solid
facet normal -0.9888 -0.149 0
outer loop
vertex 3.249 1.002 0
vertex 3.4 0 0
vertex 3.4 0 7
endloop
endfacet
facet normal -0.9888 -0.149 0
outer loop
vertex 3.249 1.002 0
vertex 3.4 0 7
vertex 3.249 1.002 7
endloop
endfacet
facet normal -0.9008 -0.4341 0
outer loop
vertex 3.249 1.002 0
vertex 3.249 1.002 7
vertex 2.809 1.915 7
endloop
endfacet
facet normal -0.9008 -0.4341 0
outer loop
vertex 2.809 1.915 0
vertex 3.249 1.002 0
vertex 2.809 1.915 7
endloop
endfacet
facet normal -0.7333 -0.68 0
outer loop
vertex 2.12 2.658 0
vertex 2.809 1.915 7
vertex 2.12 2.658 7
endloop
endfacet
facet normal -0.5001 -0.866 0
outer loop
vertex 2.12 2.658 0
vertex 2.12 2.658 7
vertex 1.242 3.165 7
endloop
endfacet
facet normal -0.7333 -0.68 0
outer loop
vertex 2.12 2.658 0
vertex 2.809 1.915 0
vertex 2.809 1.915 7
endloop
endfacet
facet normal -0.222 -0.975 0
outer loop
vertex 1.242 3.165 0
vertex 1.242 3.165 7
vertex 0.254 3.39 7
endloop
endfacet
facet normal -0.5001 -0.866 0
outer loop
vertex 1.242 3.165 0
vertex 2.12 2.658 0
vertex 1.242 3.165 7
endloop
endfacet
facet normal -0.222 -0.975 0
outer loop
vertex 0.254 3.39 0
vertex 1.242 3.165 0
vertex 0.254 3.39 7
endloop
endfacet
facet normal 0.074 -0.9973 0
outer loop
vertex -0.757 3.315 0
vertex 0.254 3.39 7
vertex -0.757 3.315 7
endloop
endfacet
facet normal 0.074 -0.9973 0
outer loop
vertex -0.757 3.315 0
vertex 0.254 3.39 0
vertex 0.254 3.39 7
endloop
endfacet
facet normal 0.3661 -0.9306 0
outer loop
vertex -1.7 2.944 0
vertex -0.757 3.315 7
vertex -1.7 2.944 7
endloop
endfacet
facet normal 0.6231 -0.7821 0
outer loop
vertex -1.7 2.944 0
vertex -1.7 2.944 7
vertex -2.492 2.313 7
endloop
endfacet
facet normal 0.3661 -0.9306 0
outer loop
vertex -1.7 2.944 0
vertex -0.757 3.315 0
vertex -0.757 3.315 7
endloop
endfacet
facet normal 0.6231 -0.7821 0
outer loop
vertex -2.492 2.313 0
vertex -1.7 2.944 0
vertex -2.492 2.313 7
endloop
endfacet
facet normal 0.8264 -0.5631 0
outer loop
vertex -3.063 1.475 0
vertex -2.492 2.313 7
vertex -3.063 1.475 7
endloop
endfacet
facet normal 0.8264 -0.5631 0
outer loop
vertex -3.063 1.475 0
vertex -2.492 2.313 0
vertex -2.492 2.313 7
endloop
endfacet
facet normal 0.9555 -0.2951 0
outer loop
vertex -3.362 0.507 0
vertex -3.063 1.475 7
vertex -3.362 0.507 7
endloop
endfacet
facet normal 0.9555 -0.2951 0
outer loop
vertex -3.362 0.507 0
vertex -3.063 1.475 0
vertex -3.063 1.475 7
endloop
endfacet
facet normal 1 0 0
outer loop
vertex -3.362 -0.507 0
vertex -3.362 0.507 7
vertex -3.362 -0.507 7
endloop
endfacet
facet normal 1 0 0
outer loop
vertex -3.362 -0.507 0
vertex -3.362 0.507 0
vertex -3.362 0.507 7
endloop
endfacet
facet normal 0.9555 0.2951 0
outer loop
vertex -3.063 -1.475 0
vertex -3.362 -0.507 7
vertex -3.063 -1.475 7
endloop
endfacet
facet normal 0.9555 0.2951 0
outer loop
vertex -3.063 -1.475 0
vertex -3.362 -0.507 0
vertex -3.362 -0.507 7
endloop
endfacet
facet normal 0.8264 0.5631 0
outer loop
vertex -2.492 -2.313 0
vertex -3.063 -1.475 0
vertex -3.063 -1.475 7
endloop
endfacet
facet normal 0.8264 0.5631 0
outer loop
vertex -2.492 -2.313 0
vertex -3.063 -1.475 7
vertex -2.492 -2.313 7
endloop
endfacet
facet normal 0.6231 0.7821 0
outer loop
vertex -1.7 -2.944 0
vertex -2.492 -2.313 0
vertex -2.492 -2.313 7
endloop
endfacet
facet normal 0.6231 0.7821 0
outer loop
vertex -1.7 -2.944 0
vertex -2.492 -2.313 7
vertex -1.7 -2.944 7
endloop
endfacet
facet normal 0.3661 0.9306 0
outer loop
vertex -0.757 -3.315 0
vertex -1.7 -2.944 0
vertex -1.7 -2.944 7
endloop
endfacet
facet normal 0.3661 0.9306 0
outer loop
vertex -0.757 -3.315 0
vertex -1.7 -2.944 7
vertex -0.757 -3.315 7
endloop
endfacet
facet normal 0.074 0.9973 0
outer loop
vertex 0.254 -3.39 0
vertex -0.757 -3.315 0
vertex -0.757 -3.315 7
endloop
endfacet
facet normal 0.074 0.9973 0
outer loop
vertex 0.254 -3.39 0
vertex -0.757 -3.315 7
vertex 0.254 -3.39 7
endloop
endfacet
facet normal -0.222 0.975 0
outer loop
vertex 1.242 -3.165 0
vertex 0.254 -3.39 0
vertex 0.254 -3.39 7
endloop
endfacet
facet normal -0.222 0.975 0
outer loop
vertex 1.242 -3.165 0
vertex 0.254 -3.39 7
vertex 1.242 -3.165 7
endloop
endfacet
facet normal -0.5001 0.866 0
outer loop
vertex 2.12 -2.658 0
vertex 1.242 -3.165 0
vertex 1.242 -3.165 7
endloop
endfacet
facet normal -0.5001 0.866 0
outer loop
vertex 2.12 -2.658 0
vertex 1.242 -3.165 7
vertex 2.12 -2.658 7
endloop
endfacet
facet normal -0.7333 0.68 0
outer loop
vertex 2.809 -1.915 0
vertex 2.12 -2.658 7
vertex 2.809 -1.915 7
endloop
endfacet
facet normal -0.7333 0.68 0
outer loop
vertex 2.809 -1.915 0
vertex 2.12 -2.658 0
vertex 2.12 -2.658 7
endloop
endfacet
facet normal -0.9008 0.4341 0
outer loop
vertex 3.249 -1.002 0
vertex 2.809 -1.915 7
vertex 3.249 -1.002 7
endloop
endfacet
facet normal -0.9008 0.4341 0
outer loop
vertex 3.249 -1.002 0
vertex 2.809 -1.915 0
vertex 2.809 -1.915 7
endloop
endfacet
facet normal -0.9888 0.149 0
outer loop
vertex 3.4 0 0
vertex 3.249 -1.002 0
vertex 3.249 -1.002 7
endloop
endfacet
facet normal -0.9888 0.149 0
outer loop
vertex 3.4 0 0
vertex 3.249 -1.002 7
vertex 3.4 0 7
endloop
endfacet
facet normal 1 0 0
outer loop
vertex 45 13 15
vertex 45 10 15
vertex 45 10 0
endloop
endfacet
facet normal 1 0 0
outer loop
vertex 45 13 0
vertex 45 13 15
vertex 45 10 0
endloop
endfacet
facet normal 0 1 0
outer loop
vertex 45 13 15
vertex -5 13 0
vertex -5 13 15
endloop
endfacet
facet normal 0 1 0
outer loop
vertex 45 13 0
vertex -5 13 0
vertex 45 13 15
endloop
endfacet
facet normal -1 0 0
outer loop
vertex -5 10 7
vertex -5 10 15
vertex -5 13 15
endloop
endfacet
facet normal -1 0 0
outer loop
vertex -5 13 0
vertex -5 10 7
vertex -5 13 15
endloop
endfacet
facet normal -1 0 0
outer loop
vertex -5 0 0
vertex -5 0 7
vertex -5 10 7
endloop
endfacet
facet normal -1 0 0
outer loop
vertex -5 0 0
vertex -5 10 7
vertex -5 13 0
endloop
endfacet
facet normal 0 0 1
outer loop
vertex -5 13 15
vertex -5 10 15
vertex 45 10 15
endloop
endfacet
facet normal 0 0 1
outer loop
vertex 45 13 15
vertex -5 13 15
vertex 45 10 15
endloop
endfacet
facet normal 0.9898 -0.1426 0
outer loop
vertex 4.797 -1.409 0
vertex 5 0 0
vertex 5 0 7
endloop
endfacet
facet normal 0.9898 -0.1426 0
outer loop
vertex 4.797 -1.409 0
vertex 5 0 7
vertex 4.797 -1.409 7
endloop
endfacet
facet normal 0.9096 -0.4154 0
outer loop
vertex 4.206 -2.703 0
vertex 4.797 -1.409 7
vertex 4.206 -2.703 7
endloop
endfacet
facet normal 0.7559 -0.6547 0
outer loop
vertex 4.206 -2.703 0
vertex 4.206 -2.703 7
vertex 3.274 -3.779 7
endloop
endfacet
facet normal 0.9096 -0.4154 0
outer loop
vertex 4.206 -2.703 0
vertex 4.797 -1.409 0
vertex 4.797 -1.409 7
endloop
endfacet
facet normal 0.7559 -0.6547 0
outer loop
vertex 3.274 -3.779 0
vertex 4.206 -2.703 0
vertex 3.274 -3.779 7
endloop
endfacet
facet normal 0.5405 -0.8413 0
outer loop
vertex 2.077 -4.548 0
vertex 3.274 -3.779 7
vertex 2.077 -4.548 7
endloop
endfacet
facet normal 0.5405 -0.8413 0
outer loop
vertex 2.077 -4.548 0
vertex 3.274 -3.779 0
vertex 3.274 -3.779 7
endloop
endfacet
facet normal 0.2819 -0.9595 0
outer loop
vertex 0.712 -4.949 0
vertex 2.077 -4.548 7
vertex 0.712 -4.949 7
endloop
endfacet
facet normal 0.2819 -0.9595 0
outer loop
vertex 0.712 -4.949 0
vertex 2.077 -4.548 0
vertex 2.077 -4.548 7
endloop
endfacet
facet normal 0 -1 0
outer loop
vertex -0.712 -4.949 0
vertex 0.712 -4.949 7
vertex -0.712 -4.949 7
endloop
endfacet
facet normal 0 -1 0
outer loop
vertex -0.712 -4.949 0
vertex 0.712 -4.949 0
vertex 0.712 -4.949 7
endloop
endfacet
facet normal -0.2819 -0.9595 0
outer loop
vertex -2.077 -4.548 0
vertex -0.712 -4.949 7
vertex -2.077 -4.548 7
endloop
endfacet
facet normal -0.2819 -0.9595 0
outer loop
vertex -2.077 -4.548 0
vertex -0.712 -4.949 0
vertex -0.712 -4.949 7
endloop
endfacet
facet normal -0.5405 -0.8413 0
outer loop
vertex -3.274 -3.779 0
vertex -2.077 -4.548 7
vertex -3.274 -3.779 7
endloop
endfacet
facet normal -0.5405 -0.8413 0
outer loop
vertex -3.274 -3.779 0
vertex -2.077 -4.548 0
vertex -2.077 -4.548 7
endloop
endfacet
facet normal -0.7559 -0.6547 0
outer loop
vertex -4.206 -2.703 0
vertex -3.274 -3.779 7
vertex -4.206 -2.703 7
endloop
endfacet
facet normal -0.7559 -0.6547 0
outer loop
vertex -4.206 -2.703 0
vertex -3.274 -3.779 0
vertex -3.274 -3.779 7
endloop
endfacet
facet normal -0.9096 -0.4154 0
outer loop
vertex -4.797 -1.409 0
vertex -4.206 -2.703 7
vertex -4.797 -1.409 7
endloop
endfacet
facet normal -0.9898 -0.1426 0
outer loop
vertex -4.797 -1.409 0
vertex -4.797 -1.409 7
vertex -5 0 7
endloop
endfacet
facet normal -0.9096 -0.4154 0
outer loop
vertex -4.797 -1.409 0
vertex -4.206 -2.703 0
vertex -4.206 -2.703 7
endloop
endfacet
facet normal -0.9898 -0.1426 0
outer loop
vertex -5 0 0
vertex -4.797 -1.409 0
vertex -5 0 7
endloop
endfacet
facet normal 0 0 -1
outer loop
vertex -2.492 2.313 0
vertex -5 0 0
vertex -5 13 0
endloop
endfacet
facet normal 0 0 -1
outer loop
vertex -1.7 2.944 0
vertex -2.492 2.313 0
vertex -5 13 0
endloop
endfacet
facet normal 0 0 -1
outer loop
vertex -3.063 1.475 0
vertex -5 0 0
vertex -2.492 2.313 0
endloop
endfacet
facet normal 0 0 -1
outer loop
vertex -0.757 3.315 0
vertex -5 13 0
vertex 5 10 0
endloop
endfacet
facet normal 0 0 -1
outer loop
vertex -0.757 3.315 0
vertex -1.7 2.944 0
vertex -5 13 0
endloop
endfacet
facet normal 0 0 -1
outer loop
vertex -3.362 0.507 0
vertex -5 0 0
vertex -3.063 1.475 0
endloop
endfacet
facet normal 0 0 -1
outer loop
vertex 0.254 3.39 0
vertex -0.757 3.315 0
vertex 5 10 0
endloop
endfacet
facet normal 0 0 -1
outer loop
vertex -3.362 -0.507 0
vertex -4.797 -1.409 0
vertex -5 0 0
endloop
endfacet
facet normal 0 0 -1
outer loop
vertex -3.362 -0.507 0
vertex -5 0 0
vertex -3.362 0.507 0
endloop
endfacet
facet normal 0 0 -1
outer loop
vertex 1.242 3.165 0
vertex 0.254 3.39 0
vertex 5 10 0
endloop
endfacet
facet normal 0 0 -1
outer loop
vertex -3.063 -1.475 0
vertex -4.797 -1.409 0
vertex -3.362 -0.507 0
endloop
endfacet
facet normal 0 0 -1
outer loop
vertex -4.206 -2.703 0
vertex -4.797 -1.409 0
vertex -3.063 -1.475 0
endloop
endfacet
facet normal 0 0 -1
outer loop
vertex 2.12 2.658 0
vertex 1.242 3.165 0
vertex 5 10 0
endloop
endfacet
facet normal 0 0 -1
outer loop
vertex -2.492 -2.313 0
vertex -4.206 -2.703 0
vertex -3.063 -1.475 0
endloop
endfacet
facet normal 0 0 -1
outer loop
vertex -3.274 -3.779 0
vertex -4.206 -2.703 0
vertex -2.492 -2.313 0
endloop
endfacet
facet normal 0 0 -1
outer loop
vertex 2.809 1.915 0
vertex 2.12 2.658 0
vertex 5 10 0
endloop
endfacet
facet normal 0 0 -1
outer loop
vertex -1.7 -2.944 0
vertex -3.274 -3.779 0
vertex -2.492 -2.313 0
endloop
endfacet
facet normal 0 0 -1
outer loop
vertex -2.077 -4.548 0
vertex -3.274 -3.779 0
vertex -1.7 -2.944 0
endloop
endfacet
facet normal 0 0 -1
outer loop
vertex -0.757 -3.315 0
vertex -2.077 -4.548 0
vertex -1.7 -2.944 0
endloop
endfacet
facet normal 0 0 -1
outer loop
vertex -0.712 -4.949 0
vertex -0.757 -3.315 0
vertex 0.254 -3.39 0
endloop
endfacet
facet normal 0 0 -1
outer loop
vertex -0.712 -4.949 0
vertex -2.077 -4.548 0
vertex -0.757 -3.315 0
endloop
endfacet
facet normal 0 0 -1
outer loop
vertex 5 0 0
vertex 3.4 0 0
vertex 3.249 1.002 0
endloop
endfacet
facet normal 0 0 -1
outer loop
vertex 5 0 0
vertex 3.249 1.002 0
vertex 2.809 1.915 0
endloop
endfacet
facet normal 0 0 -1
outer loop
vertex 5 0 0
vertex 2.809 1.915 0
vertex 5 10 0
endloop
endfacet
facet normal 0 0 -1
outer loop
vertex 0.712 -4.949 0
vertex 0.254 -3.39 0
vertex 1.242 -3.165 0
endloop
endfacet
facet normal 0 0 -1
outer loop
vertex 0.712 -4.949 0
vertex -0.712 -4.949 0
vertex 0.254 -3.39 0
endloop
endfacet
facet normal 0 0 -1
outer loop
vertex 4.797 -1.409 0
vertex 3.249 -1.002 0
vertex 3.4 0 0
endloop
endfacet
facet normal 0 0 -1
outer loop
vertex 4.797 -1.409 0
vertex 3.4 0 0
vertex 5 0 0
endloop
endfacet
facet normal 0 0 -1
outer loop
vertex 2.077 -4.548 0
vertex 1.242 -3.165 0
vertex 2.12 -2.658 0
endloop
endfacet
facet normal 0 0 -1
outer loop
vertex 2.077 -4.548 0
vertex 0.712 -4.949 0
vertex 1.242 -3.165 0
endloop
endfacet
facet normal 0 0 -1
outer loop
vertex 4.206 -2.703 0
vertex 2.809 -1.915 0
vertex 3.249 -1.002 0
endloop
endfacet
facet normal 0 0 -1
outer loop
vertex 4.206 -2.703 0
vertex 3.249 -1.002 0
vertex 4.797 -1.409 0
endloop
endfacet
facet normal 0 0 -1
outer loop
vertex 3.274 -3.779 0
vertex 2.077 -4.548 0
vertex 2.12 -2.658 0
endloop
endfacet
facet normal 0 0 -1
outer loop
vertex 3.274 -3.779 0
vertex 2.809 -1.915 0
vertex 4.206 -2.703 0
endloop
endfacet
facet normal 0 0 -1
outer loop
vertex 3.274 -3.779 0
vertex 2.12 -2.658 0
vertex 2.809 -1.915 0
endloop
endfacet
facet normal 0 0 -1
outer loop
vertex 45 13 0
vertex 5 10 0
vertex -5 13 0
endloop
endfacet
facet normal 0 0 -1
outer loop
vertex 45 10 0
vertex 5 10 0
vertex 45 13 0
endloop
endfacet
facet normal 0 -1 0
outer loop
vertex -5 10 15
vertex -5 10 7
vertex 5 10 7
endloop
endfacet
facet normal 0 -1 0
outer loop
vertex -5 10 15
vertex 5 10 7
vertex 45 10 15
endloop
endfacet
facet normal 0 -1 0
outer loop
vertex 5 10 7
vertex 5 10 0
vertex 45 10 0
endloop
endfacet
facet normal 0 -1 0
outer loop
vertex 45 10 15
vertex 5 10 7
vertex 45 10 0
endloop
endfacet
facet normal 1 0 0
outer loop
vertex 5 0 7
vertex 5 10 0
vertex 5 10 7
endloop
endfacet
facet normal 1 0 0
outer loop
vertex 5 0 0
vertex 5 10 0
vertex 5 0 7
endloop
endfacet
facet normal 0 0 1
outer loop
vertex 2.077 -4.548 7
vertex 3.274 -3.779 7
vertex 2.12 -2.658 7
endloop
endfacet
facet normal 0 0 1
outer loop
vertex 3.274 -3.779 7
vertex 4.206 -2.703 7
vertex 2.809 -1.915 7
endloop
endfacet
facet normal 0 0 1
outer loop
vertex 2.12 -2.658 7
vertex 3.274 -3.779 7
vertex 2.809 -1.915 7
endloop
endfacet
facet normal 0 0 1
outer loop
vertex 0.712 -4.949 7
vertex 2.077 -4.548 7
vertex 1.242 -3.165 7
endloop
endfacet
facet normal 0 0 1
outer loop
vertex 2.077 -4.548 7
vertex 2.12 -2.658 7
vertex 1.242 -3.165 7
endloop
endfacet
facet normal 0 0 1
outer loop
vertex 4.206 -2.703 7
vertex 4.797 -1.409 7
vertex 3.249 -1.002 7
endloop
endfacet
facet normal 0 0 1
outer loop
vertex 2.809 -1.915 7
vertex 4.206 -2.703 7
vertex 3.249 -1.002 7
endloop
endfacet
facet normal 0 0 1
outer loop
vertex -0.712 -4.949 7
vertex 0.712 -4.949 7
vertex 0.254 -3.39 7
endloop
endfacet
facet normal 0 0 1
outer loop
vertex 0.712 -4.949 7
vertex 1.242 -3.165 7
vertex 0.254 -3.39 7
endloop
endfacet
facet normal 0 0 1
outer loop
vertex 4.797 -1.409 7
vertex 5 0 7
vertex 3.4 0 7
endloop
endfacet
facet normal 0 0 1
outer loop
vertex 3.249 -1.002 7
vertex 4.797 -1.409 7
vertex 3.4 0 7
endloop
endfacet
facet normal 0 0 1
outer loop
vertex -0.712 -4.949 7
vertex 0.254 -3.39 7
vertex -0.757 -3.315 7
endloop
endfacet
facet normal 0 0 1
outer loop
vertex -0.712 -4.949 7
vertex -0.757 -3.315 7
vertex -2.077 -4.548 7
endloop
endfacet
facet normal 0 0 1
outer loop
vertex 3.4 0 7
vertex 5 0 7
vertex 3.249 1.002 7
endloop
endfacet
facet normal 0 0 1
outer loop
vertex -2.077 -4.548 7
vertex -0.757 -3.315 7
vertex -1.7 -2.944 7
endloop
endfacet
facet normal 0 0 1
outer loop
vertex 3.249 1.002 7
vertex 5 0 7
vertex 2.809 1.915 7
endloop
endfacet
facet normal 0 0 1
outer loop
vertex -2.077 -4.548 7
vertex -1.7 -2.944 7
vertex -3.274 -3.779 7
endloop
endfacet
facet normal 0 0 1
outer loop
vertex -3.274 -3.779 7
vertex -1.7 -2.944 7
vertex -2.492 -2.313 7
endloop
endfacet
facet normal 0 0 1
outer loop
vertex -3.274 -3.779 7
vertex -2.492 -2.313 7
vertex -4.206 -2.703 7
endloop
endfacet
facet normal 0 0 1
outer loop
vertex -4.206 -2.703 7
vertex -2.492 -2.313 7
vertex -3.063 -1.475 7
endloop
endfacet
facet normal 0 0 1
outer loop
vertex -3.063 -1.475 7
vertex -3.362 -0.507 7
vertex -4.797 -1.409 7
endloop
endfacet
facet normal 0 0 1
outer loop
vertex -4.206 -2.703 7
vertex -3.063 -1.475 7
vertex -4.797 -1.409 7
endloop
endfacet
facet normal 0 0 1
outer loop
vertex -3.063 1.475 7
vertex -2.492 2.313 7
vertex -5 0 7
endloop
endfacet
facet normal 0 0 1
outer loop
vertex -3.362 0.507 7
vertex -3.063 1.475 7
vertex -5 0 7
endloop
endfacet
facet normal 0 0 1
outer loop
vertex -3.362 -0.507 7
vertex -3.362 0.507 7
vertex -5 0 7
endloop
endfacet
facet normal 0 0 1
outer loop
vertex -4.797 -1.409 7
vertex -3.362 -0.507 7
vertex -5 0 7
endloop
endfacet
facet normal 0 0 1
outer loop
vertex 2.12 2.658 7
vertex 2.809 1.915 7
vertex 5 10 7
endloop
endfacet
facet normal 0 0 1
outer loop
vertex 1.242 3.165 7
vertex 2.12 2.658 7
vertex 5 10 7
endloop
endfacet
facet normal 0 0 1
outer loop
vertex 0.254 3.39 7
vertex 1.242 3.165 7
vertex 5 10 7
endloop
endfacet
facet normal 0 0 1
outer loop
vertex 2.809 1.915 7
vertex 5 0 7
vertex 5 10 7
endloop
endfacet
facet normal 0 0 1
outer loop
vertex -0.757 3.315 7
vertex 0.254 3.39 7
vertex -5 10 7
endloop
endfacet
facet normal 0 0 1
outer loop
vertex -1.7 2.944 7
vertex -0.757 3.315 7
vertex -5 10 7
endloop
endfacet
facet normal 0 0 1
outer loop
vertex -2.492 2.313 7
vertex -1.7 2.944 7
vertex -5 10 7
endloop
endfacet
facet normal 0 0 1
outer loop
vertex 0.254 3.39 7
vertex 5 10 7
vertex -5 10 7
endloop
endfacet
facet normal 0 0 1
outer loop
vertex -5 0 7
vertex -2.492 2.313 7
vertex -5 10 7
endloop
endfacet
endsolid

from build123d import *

# Parameters (mm, degrees)
SKETCH_1_R      = 3.4
EXTRUDE_1_DEPTH = 7
SKETCH_2_W      = 50
SKETCH_2_H      = 15
EXTRUDE_2_DEPTH = 3


with BuildPart() as part:
    # 草图1 → 凸台-拉伸1 (new body)
    with BuildSketch(Plane.XY):
        with BuildLine():
            Line((-5, 0), (-5, 10))
            Line((-5, 10), (5, 10))
            Line((5, 10), (5, 0))
            ThreePointArc((5, 0), (0, -5), (-5, 0))
        make_face()
        Circle(SKETCH_1_R, mode=Mode.SUBTRACT)
    extrude(amount=EXTRUDE_1_DEPTH)

    # 草图2 → 凸台-拉伸2 (add)
    with BuildSketch(Plane(origin=(0, 10, 0), x_dir=(1, 0, 0), z_dir=(0, 1, 0))):
        with Locations((20, -7.5)):
            Rectangle(SKETCH_2_W, SKETCH_2_H)
    extrude(amount=EXTRUDE_2_DEPTH)


solid = part.part
